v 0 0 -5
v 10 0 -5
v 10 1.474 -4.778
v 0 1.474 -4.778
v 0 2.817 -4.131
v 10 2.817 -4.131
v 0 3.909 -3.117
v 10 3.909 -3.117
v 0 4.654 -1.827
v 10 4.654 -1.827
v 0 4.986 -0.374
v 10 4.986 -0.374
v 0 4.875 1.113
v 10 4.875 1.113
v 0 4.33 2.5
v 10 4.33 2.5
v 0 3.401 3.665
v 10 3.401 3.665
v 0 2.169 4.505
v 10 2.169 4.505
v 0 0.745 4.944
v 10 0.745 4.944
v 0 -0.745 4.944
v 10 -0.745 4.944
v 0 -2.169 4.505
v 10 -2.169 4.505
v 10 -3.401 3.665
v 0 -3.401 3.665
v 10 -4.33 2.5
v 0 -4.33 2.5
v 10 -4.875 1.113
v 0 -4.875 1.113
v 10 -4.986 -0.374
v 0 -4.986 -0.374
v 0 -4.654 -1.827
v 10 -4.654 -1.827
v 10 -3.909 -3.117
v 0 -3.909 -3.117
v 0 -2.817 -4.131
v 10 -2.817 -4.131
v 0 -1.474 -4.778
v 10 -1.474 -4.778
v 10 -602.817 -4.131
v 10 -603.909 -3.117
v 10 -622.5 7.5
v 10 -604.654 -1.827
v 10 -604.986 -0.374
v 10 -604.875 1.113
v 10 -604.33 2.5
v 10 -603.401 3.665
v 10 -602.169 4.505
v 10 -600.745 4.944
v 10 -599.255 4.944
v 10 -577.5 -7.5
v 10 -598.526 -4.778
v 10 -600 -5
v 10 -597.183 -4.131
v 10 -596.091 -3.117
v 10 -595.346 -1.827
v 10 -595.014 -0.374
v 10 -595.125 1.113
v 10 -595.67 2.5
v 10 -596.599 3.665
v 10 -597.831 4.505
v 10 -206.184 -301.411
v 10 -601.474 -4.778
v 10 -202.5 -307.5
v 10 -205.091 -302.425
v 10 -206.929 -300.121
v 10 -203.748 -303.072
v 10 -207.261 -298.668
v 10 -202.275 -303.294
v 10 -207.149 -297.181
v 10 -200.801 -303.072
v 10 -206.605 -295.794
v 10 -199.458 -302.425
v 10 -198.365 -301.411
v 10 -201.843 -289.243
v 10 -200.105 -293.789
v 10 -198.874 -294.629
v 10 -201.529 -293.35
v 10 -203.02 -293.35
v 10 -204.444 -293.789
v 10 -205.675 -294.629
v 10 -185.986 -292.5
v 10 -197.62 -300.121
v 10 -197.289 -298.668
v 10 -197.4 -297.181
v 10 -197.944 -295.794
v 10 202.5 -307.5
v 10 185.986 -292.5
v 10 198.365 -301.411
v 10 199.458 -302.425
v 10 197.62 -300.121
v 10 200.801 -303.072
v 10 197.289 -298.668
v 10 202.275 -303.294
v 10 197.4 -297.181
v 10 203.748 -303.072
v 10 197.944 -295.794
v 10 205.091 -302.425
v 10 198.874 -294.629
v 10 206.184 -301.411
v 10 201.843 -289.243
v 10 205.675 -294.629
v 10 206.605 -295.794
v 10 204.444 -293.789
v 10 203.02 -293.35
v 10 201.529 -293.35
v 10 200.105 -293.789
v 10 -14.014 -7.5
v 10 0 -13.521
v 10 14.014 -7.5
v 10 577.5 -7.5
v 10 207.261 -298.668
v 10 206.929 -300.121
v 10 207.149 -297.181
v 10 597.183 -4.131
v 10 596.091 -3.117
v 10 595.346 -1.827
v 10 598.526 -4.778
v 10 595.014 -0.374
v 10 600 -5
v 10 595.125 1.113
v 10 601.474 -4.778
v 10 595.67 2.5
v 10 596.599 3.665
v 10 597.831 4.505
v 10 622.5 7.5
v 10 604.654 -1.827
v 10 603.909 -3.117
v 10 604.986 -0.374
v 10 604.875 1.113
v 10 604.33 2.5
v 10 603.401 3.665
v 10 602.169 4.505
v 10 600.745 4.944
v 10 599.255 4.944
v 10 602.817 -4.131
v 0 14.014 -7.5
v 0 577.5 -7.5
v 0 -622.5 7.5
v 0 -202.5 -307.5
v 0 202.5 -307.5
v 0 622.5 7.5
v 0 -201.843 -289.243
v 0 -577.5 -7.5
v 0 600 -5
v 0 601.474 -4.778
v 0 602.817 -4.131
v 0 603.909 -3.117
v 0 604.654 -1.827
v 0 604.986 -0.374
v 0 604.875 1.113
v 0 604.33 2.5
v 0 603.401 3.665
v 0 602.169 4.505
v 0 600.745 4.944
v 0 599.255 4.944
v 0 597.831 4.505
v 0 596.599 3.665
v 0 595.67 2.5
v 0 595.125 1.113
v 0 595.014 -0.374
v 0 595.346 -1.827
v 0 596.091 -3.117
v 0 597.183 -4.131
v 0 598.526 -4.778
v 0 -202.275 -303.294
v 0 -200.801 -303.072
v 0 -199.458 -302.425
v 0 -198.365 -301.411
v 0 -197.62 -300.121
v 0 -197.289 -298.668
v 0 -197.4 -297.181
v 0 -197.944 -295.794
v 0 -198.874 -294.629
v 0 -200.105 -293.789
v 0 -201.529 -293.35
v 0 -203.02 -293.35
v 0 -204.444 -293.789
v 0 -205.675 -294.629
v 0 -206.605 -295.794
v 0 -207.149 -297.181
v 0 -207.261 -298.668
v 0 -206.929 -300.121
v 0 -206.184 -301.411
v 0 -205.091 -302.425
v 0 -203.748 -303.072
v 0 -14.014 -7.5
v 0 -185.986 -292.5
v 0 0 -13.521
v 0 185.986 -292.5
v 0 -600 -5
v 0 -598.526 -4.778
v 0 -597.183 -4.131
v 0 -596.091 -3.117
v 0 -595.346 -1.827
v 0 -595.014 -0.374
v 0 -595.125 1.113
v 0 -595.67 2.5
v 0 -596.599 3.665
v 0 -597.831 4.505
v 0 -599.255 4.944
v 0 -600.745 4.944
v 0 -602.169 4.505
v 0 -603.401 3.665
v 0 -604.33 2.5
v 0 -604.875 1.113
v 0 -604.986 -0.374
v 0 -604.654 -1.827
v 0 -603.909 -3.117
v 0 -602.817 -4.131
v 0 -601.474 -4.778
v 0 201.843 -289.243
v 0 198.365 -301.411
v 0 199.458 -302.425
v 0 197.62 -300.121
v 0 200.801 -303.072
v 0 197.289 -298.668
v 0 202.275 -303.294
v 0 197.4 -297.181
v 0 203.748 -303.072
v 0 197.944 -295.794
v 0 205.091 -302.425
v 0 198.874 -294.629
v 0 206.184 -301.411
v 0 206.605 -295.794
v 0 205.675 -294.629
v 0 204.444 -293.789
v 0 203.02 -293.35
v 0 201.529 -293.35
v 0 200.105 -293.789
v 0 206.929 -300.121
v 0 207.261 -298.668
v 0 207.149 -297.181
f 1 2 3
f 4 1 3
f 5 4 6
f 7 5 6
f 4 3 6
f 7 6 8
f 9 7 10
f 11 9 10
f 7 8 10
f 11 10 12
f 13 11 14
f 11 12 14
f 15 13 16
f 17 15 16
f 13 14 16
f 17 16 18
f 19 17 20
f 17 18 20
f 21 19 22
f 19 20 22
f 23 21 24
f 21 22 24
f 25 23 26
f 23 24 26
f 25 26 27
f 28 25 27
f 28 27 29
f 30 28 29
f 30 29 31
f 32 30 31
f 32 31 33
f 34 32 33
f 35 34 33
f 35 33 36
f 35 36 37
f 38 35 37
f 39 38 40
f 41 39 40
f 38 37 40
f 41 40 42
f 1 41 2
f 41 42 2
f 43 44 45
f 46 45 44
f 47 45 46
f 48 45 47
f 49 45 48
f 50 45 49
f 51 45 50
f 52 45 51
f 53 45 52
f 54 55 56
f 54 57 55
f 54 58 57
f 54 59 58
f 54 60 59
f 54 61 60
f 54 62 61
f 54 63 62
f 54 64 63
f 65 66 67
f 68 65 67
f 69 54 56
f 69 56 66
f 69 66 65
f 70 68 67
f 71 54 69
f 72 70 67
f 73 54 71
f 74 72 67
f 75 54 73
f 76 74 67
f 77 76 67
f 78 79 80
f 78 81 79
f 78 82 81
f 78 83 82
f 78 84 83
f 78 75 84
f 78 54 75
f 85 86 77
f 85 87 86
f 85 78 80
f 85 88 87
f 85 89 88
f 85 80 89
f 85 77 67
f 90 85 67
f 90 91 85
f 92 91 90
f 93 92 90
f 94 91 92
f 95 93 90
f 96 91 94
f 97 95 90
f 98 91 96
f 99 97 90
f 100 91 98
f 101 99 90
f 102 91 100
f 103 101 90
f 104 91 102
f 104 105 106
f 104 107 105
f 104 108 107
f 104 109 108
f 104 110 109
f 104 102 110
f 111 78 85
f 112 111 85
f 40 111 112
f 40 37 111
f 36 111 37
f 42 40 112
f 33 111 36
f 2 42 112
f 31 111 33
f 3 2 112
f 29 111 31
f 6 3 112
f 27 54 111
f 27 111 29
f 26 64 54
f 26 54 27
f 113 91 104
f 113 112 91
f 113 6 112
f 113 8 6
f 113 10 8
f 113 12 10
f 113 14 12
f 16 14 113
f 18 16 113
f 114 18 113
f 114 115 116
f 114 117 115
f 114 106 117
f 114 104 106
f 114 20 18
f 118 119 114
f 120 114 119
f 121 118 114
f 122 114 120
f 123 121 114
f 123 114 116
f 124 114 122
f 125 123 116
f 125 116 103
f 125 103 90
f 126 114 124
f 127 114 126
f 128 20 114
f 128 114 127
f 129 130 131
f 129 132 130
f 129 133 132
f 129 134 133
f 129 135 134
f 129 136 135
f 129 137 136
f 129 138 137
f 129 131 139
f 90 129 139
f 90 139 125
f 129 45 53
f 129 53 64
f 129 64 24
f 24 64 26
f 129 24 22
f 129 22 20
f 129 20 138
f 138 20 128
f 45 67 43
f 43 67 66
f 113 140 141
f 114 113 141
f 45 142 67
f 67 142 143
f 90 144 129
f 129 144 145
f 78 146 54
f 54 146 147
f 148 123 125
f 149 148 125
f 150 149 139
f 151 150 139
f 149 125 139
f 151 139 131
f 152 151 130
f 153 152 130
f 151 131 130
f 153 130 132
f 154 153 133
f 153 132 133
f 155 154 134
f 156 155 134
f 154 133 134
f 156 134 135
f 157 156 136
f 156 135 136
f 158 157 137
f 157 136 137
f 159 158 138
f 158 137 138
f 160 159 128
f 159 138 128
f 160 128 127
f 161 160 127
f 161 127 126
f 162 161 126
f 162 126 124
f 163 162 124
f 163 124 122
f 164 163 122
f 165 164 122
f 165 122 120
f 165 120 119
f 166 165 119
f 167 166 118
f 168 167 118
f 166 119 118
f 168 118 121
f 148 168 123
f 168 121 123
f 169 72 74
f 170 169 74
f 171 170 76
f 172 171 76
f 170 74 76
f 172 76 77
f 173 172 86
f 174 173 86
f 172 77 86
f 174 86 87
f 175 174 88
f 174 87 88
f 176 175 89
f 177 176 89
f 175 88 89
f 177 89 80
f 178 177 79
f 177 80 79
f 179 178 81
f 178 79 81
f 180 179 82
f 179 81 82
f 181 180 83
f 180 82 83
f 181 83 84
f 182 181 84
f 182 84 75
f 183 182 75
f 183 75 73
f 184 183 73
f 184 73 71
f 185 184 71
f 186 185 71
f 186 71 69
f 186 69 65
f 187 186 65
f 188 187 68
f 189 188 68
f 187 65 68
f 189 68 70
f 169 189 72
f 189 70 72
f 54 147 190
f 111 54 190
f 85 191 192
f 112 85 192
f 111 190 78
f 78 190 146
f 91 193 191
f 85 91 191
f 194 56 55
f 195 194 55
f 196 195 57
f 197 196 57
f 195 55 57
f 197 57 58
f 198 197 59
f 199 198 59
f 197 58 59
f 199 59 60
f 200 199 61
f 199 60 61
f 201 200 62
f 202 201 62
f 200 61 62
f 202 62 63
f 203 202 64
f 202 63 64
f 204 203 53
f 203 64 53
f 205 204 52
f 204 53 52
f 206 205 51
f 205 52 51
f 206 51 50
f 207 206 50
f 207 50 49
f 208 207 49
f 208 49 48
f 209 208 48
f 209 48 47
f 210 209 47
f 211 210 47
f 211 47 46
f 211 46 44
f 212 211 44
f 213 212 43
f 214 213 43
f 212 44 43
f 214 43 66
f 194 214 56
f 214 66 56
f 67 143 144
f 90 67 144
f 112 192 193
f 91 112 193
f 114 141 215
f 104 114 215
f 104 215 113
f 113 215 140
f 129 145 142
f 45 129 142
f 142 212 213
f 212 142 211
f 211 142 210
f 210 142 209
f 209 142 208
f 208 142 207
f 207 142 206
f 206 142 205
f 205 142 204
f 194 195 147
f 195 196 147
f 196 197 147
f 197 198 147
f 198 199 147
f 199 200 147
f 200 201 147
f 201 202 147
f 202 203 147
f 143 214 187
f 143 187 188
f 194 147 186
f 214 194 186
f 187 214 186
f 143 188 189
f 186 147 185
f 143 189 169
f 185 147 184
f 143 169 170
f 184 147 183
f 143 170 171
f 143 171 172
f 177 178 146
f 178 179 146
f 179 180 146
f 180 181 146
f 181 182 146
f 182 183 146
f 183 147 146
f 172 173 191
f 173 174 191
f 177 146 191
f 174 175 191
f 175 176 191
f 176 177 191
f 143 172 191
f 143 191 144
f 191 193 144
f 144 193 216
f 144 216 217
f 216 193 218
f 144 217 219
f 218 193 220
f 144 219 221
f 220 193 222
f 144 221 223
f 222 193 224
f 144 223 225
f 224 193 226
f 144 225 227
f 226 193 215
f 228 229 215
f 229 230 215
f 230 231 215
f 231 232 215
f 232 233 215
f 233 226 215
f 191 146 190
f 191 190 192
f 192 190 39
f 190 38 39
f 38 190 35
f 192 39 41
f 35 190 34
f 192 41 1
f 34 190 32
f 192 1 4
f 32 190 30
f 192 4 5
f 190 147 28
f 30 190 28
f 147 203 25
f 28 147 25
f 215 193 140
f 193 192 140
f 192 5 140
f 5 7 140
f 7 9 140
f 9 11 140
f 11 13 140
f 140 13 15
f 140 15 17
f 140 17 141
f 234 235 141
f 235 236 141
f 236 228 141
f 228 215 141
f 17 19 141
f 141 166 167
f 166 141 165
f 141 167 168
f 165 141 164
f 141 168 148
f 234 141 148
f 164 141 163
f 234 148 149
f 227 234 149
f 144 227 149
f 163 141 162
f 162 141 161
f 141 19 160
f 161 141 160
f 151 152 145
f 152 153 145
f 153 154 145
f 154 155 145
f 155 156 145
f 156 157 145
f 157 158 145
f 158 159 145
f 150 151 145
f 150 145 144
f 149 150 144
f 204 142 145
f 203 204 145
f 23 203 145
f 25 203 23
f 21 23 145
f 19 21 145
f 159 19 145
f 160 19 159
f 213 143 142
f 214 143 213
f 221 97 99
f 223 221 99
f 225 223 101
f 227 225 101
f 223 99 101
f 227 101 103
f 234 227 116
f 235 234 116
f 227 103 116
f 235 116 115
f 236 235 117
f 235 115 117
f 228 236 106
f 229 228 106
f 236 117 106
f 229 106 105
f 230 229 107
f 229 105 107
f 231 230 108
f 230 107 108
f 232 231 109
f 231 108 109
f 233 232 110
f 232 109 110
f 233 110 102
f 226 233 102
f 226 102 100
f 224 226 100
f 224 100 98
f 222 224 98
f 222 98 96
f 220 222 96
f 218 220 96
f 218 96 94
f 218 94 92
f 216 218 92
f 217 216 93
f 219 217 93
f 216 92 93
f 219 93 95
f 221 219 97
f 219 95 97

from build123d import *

# Parameters (mm, degrees)
BOSS_EXTRUDE2_DEPTH = 10
SKETCH6_R           = 5
CUT_EXTRUDE3_DEPTH  = 10


with BuildPart() as part:
    # Sketch4 → Boss-Extrude2 (new body)
    with BuildSketch(Plane.YZ):
        Polygon((-185.986121811, -292.5), (-190.986121811, -300), (190.986121811, -300), (185.986121811, -292.5), align=None)
        Polygon((600, 0), (9.013878189, 0), (14.013878189, -7.5), (577.5, -7.5), (201.842585459, -289.243060906), (197.5, -292.5), (195, -292.5), (200, -300), align=None)
        Polygon((-200, -300), (-600, 0), (-9.013878189, 0), (0, 0), (9.013878189, 0), (600, 0), (200, -300), (190.986121811, -300), (195.986121811, -307.5), (202.5, -307.5), (622.5, 7.5), (-622.5, 7.5), (-202.5, -307.5), (-195.986121811, -307.5), (-190.986121811, -300), align=None)
        Polygon((-9.013878189, 0), (-600, 0), (-200, -300), (-195, -292.5), (-197.5, -292.5), (-201.842585459, -289.243060906), (-577.5, -7.5), (-14.013878189, -7.5), align=None)
        Polygon((-5, -7.5), (-14.013878189, -7.5), (-201.842585459, -289.243060906), (-197.5, -292.5), (-195, -292.5), align=None)
        Polygon((-5, -7.5), (-195, -292.5), (-185.986121811, -292.5), (0, -13.520817283), (185.986121811, -292.5), (195, -292.5), (5, -7.5), align=None)
        Polygon((-195, -292.5), (-200, -300), (-190.986121811, -300), (-185.986121811, -292.5), align=None)
        Polygon((190.986121811, -300), (-190.986121811, -300), (-195.986121811, -307.5), (195.986121811, -307.5), align=None)
        Polygon((14.013878189, -7.5), (5, -7.5), (195, -292.5), (197.5, -292.5), (201.842585459, -289.243060906), align=None)
        Polygon((185.986121811, -292.5), (190.986121811, -300), (200, -300), (195, -292.5), align=None)
        Polygon((0, 0), (-9.013878189, 0), (-14.013878189, -7.5), (-5, -7.5), align=None)
        Polygon((9.013878189, 0), (0, 0), (5, -7.5), (14.013878189, -7.5), align=None)
        Polygon((5, -7.5), (0, 0), (-5, -7.5), align=None)
    extrude(amount=BOSS_EXTRUDE2_DEPTH)

    # Sketch6 → Cut-Extrude3 (cut)
    with BuildSketch(Plane.YZ.offset(10)):
        with Locations(Location((0, 0, 0), (0, 0, 270))):
            Circle(SKETCH6_R)
        with Locations(Location((-600, 0, 0), (0, 0, 270))):
            Circle(SKETCH6_R)
        with Locations(Location((-202.274610117, -298.294042412, 0), (0, 0, 270))):
            Circle(SKETCH6_R)
        with Locations(Location((202.274610117, -298.294042412, 0), (0, 0, 270))):
            Circle(SKETCH6_R)
        with Locations(Location((600, 0, 0), (0, 0, 270))):
            Circle(SKETCH6_R)
    extrude(amount=-CUT_EXTRUDE3_DEPTH, mode=Mode.SUBTRACT)


solid = part.part
